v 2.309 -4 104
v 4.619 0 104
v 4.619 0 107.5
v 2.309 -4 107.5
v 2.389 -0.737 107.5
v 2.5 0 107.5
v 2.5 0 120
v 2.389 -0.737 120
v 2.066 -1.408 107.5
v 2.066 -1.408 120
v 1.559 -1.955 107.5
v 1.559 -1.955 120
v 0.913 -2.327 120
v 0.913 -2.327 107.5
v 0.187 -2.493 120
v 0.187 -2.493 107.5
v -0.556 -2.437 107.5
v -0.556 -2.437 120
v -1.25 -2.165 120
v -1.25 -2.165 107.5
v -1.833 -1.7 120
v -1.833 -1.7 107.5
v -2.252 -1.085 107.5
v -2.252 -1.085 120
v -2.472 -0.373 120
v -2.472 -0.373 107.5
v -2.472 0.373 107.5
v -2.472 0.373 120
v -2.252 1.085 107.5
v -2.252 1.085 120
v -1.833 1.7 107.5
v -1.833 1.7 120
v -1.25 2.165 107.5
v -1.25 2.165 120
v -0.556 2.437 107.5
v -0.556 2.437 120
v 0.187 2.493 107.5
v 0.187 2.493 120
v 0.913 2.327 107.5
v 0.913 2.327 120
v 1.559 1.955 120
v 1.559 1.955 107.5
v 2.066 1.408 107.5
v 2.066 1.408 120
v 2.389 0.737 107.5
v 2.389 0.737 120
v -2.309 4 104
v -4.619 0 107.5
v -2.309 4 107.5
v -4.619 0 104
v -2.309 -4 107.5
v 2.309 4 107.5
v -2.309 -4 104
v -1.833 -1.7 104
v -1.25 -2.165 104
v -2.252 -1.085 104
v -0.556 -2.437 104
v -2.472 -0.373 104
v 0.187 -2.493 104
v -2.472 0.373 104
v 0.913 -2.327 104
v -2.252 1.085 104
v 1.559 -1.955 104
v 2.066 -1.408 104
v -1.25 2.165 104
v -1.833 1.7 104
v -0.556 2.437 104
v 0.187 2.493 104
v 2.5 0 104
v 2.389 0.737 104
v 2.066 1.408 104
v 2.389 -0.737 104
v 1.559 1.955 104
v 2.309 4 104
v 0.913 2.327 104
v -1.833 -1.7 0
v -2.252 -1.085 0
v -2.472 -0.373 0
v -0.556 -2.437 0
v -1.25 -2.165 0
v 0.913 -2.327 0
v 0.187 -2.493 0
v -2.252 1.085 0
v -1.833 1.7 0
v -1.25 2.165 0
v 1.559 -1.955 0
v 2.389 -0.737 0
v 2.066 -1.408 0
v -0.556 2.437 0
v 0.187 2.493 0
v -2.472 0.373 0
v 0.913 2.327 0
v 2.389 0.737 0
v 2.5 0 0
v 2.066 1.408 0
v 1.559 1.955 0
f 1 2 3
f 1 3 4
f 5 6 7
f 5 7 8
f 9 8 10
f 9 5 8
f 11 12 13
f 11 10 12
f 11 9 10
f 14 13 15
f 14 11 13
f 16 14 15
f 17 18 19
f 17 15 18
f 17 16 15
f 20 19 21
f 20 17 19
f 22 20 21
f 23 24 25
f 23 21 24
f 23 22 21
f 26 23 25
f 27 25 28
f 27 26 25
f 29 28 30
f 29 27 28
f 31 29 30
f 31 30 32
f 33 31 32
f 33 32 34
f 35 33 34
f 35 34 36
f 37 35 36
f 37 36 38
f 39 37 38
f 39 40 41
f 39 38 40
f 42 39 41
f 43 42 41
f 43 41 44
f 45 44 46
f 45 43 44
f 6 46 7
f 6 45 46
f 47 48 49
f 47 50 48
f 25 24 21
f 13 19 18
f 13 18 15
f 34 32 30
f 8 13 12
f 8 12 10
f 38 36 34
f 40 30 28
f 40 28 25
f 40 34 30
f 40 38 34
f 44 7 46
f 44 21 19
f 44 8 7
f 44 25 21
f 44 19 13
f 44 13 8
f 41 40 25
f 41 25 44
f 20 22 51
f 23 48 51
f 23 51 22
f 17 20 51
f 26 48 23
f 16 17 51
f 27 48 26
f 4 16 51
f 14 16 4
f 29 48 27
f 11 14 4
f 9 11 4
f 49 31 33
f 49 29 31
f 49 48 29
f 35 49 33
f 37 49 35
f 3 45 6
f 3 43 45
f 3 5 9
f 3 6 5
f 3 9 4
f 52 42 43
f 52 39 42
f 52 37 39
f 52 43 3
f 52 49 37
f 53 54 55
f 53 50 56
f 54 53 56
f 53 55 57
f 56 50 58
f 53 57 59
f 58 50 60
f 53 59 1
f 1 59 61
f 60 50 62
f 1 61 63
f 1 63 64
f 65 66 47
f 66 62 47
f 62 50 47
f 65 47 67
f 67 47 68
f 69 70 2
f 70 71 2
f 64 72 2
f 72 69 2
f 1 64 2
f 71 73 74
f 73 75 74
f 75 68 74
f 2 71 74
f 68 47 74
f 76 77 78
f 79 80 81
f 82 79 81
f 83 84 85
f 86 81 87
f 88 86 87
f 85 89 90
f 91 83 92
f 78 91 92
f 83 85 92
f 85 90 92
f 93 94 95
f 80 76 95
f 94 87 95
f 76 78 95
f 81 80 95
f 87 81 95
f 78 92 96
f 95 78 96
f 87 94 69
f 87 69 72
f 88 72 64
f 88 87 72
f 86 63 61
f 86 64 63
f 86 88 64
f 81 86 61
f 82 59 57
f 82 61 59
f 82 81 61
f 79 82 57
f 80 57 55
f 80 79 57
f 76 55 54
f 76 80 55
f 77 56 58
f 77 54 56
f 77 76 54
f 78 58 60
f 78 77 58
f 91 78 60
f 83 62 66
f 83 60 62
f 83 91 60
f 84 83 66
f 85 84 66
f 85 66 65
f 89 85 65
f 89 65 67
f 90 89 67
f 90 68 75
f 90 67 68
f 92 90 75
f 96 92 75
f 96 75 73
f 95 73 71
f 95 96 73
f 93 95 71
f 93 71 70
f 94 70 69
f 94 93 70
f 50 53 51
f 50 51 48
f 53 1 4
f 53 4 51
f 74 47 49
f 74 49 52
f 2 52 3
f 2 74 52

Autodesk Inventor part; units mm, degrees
ref_plane "YZ Plane" through (0, 0, 0) normal (1, 0, 0) x (0, 1, 0)
ref_plane "XZ Plane" through (0, 0, 0) normal (0, 1, 0) x (-1, 0, 0)
ref_plane "XY Plane" through (0, 0, 0) normal (0, 0, 1) x (1, 0, 0)
sketch "スケッチ1" plane through (0, 0, 0) normal (0, 0, 1) x (1, 0, 0)
  circle A0 centre (0, 0) radius 2.5
  dimension "d0" = 5
extrude "押し出し1" add sketch "スケッチ1" along normal blind 104
sketch "スケッチ2" plane through (0, 0, 104) normal (0, 0, 1) x (1, 0, 0)
  line L0 (4.6188, 0) -> (2.3094, -4)
  line L1 (2.3094, -4) -> (-2.3094, -4)
  line L2 (-2.3094, -4) -> (-4.6188, 0)
  line L3 (-4.6188, 0) -> (-2.3094, 4)
  line L4 (-2.3094, 4) -> (2.3094, 4)
  line L5 (2.3094, 4) -> (4.6188, 0)
  point P0 (0, 0)
  point P1 (0, 0)
  dimension "d3" = 8
extrude "押し出し2" add sketch "スケッチ2" along normal blind 3.5
sketch "スケッチ3" plane through (0, 0, 107.5) normal (0, 0, 1) x (1, 0, 0)
  circle A0 centre (0, 0) radius 2.5
  dimension "d6" = 5
extrude "押し出し3" add sketch "スケッチ3" along normal blind 12.5
properties part number "aircylinder16_100_part2_sa" material "アルミニウム 6061-AHC"
